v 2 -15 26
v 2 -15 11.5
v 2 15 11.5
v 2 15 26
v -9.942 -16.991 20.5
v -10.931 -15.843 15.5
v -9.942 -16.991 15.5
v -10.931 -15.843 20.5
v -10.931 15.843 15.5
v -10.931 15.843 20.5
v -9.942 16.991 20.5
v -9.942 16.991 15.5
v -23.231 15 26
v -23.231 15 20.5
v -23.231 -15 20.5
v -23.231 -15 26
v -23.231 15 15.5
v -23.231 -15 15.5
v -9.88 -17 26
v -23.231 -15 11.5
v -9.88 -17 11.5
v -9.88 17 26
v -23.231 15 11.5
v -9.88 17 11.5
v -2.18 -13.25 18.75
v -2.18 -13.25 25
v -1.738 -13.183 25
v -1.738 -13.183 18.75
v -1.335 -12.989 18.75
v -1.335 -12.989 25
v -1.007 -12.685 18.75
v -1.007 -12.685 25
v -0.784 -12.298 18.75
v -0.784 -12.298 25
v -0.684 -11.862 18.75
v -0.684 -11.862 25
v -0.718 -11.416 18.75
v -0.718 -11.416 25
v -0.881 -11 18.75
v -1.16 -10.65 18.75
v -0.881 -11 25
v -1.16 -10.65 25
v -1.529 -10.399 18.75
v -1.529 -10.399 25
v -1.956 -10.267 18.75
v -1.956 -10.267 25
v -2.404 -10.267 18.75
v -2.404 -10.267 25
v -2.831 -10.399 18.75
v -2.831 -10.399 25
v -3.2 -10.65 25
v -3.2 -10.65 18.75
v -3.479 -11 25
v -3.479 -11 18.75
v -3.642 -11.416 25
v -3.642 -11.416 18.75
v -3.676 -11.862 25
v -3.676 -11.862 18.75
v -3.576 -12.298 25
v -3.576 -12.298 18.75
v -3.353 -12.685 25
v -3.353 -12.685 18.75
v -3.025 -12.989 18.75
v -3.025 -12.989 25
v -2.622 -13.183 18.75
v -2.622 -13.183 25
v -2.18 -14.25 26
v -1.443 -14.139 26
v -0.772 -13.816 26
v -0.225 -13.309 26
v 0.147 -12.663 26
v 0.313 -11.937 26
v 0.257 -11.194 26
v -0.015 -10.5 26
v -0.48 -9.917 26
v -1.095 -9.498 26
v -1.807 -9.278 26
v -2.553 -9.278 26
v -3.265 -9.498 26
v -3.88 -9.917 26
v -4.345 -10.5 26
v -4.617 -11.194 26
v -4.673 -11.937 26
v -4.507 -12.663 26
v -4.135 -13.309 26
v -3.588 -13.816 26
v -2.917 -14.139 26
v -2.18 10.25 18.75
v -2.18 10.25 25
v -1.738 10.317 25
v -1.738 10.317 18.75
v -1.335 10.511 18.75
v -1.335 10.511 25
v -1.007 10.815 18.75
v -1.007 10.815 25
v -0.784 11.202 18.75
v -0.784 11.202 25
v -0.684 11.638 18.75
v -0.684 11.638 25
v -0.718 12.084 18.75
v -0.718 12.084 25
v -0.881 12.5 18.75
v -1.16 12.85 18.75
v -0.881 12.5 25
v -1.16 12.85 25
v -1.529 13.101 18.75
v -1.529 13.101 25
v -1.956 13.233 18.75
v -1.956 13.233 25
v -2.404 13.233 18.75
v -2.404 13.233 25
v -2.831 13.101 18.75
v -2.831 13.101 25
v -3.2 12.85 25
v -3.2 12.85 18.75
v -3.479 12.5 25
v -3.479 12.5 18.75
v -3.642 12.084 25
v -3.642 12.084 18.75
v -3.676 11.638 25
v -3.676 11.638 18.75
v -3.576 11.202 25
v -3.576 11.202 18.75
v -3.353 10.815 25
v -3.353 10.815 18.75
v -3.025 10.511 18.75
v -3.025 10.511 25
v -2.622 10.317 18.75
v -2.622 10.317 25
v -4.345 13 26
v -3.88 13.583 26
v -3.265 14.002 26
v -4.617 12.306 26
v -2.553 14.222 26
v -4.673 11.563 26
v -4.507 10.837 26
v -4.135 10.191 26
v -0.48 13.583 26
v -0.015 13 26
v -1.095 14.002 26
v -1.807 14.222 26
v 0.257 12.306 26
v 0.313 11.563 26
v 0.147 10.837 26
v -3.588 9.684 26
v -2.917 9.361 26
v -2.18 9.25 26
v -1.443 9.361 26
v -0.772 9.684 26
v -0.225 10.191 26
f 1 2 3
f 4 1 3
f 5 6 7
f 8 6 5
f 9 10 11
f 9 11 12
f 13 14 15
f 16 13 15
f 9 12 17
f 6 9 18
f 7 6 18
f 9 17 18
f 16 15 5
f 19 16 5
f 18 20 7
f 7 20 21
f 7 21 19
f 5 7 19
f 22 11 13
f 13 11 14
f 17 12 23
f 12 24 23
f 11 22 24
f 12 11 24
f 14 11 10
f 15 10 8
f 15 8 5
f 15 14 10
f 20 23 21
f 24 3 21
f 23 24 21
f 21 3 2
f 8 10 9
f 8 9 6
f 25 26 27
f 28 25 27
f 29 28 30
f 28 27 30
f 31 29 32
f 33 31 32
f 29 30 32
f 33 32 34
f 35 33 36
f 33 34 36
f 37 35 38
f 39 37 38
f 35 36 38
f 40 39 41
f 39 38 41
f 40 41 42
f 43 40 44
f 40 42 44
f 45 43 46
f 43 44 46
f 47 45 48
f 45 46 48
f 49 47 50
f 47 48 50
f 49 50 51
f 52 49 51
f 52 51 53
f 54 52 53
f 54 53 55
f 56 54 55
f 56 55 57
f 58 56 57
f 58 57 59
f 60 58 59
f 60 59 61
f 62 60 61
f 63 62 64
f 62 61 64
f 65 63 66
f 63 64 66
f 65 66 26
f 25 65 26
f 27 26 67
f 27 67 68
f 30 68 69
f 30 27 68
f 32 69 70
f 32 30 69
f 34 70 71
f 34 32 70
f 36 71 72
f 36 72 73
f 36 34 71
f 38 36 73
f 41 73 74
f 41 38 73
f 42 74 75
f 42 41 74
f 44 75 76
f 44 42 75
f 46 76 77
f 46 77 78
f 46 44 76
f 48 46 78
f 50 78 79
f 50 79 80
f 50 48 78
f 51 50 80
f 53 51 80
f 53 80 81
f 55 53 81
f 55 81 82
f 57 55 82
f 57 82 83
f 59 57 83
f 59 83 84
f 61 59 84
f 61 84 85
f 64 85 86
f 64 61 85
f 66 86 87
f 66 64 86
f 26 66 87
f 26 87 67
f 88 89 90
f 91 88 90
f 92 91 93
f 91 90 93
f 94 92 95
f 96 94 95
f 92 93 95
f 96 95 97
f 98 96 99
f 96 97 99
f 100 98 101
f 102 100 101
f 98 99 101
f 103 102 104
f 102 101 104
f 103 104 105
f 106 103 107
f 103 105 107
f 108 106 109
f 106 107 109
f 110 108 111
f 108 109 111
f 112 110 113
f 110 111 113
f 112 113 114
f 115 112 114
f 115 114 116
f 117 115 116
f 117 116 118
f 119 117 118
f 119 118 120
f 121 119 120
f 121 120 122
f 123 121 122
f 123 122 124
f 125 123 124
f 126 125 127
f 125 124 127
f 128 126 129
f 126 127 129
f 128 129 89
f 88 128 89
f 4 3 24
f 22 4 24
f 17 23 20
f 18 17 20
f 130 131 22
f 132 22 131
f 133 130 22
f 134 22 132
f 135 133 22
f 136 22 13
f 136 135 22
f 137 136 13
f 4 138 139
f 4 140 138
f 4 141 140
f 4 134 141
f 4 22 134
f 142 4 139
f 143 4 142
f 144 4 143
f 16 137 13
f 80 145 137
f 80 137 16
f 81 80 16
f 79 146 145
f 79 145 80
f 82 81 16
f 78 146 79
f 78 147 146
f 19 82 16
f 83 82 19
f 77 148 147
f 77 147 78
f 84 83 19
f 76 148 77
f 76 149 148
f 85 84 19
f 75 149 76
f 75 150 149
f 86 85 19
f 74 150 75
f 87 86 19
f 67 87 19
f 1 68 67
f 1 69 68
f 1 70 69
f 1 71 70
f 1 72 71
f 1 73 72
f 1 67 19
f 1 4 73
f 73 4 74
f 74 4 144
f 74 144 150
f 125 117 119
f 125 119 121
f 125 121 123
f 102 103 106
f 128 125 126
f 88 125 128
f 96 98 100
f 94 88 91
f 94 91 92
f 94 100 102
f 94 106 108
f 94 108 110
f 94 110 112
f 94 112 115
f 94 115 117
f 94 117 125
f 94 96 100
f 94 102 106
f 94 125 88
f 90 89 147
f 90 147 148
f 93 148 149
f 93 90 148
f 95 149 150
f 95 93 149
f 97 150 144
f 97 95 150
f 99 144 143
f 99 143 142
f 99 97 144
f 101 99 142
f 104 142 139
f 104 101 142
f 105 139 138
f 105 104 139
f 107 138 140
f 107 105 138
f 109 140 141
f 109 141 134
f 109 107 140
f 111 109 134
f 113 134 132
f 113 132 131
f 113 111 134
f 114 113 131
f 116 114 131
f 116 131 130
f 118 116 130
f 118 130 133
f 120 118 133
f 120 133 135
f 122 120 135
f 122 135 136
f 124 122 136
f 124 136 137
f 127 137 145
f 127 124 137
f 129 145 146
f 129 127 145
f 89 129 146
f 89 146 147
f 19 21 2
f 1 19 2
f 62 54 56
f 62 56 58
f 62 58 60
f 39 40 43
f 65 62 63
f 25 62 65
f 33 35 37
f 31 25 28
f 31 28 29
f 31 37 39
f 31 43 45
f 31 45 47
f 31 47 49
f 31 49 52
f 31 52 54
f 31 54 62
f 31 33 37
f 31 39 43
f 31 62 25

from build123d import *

# Parameters (mm, degrees)
PAD003_DEPTH    = 14.5
SKETCH021_R     = 1.5
POCKET002_DEPTH = 7.25
SKETCH023_W     = 34
SKETCH023_H     = 5
POCKET003_DEPTH = 12.3
CHAMFER006_SIZE = 1
CHAMFER007_SIZE = 1


with BuildPart() as part:
    # Sketch022 → Pad003 (new body)
    with BuildSketch(Plane(origin=(0, 0, 11.5), x_dir=(0, -1, 0), z_dir=(0, 0, 1))):
        Polygon((-15, -23.23103), (15, -23.23103), (17, -9.88), (15, 2), (-15, 2), (-17, -9.88), align=None)
    extrude(amount=PAD003_DEPTH)

    # Sketch021 (on Face8 of Pad003) → Pocket002 (cut)
    with BuildSketch(Plane(origin=(0, 0, 26), x_dir=(0, -1, 0), z_dir=(0, 0, 1))):
        with Locations((11.75, -2.18)):
            Circle(SKETCH021_R)
        with Locations((-11.75, -2.18)):
            Circle(SKETCH021_R)
    extrude(amount=-POCKET002_DEPTH, mode=Mode.SUBTRACT)

    # Sketch023 (on Face8 of Pocket002) → Pocket003 (cut)
    with BuildSketch(Plane(origin=(-23.23103, 0, 11.5), x_dir=(0, -1, 0), z_dir=(-1, 0, 0))):
        with Locations((0, 6.5)):
            Rectangle(SKETCH023_W, SKETCH023_H)
    extrude(amount=-POCKET003_DEPTH, mode=Mode.SUBTRACT)

    # Chamfer006
    chamfer006_edges = [part.edges().sort_by_distance(p)[0] for p in [
        (-10.93103, -16.842554, 18),
        (-10.93103, 16.842554, 18),
    ]]
    chamfer(chamfer006_edges, length=CHAMFER006_SIZE)

    # Chamfer007
    chamfer007_edges = [part.edges().sort_by_distance(p)[0] for p in [
        (-2.18, -10.25, 26),
        (-2.18, 13.25, 26),
    ]]
    chamfer(chamfer007_edges, length=CHAMFER007_SIZE)


solid = part.part
